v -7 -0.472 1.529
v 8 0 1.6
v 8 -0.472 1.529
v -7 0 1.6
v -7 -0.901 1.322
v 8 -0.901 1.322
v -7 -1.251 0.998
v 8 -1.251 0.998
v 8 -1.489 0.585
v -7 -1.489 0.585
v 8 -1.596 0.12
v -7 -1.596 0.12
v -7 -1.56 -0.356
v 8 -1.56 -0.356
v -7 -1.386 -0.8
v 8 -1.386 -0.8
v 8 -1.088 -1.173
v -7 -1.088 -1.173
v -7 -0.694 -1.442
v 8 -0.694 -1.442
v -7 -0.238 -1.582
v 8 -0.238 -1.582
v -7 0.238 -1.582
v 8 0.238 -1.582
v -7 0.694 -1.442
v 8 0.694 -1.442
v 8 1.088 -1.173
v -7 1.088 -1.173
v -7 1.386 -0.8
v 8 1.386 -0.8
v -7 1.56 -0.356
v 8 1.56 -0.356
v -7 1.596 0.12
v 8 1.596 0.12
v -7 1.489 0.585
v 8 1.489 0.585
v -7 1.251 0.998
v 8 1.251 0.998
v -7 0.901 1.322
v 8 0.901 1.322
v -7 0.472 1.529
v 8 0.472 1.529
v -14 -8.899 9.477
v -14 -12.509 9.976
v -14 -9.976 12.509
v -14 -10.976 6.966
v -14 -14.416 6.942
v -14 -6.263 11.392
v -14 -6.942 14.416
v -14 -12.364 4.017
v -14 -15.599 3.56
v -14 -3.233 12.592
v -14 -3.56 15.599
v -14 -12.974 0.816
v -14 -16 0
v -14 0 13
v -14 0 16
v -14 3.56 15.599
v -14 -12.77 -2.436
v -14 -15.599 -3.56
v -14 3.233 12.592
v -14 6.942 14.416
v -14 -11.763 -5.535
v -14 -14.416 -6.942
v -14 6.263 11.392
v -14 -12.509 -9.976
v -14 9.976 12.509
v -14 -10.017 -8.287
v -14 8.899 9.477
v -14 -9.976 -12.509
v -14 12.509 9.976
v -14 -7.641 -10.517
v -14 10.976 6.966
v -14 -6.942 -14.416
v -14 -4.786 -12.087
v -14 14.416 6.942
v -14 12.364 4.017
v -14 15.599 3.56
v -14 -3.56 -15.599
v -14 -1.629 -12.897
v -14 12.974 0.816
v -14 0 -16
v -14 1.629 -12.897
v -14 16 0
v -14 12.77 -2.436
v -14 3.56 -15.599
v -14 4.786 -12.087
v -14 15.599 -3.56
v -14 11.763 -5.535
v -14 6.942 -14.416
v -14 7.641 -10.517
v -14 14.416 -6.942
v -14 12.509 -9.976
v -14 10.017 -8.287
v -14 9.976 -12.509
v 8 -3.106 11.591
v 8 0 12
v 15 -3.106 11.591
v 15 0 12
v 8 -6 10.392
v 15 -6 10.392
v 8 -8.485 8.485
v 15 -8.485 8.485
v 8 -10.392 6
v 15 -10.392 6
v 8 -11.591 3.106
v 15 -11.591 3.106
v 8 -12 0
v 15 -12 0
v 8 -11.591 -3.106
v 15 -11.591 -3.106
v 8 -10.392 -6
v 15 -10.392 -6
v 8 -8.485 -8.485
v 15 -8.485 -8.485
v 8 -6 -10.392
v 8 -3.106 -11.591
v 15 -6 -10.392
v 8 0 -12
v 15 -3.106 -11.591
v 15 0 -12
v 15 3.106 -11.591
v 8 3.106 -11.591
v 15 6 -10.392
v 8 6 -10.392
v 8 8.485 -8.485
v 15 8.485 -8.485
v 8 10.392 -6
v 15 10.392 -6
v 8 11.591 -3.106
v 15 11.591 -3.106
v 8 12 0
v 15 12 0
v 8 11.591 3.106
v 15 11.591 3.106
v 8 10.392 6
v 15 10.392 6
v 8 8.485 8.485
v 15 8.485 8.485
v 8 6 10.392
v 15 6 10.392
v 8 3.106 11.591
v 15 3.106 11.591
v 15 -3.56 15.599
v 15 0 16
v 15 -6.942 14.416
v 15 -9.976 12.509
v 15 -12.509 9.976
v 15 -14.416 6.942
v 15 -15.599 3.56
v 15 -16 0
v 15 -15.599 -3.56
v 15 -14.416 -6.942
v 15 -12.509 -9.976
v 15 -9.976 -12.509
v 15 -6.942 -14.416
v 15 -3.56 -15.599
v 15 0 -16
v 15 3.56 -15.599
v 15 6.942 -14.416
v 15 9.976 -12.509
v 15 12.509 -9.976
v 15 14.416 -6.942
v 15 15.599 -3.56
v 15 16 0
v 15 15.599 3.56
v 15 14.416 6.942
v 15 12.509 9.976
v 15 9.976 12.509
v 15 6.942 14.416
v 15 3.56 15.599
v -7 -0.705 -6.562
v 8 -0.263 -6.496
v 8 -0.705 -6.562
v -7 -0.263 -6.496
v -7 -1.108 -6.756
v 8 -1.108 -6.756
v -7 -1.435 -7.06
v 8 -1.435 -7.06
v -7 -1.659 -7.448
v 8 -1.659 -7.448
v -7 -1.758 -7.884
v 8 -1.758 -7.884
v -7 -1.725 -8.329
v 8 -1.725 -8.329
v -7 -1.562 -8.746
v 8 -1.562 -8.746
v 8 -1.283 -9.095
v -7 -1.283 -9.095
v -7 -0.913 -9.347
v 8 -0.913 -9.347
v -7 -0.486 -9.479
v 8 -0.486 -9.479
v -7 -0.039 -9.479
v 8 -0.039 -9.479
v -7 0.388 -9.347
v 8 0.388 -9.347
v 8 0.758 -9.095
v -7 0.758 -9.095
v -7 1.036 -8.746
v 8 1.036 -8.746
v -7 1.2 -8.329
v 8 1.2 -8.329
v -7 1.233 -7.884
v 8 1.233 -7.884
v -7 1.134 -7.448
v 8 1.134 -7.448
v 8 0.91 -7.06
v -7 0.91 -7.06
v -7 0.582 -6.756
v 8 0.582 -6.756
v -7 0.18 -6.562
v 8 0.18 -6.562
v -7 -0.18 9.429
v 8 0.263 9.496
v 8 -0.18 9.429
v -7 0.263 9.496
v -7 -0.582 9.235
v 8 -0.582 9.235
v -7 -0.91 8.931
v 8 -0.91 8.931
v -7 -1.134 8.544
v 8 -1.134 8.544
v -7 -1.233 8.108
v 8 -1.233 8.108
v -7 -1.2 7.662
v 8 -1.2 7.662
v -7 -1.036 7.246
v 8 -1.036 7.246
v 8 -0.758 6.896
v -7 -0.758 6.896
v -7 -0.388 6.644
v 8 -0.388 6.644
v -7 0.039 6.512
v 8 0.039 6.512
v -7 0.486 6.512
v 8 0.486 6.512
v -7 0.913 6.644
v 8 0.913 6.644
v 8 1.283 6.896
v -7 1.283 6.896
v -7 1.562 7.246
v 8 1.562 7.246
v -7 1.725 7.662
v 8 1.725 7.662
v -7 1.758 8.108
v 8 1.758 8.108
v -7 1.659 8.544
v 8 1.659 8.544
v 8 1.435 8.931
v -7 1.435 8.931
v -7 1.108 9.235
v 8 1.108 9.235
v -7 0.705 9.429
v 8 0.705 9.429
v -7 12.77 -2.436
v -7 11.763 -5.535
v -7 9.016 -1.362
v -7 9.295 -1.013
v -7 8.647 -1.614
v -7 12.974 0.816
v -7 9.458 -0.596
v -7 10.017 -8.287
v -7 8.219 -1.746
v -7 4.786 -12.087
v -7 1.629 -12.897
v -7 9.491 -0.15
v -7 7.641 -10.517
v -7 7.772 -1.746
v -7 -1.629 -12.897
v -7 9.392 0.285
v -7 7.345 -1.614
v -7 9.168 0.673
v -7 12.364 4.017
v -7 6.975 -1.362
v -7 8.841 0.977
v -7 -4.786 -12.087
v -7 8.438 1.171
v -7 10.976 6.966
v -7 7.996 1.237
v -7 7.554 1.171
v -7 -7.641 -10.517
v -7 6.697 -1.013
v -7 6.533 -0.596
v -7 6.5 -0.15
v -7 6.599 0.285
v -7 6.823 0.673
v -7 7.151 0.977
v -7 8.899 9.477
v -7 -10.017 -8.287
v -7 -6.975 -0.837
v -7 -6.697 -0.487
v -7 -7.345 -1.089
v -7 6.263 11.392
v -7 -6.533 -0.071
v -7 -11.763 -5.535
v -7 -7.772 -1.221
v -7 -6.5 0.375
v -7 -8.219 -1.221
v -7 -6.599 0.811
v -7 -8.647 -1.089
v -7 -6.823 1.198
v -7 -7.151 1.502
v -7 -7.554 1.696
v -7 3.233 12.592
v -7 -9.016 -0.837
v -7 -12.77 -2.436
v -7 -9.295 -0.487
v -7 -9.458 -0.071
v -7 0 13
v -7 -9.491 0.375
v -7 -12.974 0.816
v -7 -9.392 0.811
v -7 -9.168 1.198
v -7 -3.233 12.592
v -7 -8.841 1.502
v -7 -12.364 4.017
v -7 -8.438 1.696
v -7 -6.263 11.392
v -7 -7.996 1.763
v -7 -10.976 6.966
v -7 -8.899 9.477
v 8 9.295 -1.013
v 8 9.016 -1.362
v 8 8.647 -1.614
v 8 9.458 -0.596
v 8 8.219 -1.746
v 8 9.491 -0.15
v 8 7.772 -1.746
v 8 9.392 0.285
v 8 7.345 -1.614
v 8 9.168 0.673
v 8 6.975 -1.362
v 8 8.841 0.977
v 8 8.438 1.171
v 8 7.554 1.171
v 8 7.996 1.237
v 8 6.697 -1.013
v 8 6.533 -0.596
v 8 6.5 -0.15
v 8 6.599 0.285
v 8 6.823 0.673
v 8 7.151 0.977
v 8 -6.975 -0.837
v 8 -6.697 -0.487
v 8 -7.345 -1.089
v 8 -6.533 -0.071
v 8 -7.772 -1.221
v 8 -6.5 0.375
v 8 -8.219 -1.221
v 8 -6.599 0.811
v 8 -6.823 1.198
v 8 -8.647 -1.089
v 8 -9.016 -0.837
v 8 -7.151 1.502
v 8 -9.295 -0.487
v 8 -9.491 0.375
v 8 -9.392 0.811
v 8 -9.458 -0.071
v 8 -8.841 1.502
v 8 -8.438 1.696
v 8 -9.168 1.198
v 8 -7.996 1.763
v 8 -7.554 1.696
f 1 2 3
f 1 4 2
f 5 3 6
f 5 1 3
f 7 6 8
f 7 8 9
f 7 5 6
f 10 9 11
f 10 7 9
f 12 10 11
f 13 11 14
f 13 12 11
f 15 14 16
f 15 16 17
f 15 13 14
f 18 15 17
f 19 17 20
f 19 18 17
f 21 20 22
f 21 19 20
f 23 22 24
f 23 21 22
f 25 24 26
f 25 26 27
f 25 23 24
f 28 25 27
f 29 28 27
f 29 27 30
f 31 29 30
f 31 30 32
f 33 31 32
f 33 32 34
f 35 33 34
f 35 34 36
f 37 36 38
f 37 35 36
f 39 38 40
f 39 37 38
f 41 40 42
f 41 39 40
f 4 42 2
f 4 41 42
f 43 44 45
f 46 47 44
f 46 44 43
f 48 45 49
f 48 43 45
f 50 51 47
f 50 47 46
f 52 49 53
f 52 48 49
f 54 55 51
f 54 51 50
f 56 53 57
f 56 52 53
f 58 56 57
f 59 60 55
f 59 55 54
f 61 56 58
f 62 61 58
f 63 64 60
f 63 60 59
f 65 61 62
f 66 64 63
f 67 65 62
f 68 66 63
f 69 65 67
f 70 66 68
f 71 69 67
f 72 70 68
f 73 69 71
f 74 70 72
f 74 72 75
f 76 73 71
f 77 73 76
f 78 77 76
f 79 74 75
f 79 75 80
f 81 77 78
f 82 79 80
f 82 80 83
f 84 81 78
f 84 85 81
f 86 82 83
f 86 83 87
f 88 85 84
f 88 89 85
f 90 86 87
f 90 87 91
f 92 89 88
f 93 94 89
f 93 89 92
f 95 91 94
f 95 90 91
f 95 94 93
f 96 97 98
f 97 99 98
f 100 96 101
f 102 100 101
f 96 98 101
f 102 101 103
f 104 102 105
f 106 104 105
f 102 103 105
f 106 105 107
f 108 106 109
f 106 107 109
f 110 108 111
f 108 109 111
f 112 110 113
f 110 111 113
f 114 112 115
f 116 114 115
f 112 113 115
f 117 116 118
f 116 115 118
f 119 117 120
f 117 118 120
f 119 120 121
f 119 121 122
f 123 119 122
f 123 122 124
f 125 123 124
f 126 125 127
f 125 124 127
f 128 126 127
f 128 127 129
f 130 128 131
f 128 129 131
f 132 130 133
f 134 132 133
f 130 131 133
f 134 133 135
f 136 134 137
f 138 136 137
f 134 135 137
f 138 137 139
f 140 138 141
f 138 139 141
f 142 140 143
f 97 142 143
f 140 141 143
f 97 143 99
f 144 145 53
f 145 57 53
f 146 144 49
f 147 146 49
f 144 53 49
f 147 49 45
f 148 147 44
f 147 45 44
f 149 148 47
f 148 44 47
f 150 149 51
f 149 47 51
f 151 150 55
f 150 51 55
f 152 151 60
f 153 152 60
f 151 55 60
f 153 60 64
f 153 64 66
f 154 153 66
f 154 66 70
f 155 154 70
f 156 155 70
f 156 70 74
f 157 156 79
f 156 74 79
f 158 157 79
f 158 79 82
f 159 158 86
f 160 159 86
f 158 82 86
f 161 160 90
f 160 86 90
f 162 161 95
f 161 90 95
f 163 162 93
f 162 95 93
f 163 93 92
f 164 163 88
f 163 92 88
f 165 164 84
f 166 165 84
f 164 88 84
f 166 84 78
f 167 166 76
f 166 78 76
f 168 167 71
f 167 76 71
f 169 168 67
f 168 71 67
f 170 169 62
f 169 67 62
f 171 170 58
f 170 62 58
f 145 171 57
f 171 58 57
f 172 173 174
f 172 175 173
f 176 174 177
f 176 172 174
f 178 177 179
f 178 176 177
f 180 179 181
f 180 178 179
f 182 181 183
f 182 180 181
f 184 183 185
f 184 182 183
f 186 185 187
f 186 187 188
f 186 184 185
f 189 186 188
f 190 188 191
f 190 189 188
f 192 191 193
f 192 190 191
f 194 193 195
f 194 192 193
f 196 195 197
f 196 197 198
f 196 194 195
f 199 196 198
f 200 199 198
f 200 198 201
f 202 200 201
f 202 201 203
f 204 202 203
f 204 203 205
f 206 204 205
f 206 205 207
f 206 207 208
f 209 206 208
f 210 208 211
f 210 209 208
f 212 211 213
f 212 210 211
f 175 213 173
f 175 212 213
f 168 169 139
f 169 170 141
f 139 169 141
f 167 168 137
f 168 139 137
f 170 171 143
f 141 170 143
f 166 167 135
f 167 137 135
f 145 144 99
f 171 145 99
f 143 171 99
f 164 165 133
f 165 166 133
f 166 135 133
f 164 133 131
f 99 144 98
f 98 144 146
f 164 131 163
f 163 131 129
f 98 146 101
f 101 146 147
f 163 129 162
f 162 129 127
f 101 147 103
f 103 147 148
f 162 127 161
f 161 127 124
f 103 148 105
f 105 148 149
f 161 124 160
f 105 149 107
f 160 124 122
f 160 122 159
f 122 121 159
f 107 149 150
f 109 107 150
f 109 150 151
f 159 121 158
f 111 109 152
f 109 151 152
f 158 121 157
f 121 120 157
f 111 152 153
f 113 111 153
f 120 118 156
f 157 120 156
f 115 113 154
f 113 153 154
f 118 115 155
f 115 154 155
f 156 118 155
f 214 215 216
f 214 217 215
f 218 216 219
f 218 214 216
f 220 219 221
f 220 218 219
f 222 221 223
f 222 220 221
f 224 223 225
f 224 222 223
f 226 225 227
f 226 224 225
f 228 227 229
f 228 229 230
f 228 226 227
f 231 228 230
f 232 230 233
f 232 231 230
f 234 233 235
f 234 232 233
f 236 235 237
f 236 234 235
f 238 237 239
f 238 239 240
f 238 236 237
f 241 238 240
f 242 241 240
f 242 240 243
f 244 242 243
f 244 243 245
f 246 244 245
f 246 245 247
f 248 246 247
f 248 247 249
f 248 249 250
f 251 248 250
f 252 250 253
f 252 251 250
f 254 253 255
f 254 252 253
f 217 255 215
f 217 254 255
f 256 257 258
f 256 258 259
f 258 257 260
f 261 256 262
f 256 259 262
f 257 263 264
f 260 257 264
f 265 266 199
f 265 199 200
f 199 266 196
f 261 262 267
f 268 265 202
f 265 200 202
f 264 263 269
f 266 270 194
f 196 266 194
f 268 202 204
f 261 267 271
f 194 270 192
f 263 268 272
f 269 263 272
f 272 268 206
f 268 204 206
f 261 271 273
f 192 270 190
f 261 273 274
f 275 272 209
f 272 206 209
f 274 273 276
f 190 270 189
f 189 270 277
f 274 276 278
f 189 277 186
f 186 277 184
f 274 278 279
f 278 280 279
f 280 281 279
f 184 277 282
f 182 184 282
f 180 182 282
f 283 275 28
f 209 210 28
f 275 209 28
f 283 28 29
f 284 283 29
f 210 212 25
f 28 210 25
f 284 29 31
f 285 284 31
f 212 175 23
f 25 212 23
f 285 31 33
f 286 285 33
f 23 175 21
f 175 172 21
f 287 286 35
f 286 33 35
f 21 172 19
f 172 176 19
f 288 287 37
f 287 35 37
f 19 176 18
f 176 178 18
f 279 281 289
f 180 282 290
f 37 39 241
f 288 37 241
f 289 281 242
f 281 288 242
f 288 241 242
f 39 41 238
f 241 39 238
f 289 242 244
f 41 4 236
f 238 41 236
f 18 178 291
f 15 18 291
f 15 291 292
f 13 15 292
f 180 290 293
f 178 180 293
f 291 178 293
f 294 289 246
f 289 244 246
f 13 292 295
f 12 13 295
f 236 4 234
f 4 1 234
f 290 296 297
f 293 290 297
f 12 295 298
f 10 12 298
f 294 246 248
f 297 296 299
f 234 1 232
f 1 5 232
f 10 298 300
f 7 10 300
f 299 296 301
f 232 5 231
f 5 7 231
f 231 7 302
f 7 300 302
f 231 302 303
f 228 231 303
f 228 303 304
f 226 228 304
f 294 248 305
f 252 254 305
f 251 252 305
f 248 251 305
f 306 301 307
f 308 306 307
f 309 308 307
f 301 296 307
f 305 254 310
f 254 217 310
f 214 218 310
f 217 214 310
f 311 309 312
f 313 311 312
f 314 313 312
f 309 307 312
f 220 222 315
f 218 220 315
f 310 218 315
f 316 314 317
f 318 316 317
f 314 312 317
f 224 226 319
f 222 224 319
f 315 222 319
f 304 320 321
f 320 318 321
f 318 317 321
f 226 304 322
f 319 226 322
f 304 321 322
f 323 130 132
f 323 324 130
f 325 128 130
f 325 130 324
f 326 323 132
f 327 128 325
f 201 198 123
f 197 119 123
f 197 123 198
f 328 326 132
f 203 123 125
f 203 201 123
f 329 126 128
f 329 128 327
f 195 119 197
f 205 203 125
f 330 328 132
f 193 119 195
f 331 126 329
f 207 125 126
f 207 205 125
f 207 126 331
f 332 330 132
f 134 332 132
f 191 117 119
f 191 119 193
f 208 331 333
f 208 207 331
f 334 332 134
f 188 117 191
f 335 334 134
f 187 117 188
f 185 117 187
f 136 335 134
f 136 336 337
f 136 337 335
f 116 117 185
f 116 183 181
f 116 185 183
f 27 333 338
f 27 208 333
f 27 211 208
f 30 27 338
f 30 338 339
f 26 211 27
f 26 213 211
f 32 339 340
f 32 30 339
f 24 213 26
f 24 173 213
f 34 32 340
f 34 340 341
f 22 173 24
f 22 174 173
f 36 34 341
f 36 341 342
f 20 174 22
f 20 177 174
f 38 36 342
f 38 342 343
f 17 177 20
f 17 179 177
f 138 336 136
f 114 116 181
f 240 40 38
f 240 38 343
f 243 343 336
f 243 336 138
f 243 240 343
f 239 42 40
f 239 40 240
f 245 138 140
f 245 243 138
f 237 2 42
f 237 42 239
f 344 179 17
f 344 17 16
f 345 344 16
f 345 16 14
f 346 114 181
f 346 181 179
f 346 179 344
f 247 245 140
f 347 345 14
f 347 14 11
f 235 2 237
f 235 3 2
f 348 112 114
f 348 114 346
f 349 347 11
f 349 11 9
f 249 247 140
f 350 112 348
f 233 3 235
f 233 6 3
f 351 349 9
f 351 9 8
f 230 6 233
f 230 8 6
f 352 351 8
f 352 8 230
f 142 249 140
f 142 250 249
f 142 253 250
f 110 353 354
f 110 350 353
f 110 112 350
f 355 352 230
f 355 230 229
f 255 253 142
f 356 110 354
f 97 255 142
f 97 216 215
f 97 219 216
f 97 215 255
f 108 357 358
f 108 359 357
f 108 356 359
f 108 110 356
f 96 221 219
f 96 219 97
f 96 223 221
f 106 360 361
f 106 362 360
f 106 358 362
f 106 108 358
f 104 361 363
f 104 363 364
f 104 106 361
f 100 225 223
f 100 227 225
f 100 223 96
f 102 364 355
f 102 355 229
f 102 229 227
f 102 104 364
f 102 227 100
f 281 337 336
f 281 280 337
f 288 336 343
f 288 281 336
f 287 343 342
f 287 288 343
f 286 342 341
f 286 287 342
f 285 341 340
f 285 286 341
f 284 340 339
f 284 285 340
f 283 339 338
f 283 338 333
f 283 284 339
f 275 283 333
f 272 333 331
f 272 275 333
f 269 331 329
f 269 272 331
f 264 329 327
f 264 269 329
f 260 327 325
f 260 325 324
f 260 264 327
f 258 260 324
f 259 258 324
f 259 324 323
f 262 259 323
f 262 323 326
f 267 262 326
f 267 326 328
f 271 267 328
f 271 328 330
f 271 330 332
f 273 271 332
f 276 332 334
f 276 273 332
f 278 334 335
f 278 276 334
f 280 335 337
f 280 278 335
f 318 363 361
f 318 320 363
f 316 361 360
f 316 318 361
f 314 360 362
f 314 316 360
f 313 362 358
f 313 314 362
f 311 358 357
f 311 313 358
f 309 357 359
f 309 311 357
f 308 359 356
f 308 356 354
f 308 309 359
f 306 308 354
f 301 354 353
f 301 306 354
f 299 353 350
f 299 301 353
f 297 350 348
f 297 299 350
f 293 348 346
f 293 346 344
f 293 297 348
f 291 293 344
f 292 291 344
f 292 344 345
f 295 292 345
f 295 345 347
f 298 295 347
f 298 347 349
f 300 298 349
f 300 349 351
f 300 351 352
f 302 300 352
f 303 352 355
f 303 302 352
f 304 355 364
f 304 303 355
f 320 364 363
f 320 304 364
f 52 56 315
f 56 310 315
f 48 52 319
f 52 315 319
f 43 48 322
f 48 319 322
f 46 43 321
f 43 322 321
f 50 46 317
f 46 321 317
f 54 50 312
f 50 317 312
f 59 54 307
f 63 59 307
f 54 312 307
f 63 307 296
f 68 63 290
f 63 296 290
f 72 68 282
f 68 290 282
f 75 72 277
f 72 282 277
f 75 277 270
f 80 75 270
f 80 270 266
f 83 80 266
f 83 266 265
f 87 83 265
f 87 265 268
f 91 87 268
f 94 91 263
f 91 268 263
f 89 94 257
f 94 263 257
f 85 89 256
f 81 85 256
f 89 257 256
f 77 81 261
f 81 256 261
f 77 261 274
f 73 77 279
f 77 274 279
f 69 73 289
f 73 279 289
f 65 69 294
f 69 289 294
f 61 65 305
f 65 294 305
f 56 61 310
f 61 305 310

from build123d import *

# Parameters (mm, degrees)
SKETCH4_R               = 1.5
CUT_EXTRUDE1_DEPTH      = 17
SKETCH5_R               = 12
SKETCH5_R_2             = 1.5
SKETCH5_R_3             = 1.6
BOSS_EXTRUDE1_DEPTH     = 2
CUT_EXTRUDE2_DEPTH      = 31.066592757
CUT_EXTRUDE2_DEPTH_BACK = 31.066592757
SKETCH6_W               = 2
SKETCH6_H               = 36


with BuildPart() as part:
    # Sketch3 → Revolve1 (revolve)
    with BuildSketch(Plane.XY, mode=Mode.PRIVATE) as revolve1_sk:
        Polygon((-7, 1.6), (6, 1.6), (6, 12), (15, 12), (15, 16), (-14, 16), (-14, 18), (-16, 18), (-16, 13), (-7, 13), align=None)
    revolve(revolve1_sk.sketch.rotate(Axis((0, 0, 0), (1, 0, 0)), 90), axis=Axis((0, 0, 0), (1, 0, 0)))

    # Sketch4 → Cut-Extrude1 (cut)
    with BuildSketch(Plane.ZY.offset(7)):
        with Locations((0.262567942, -7.995689969)):
            Circle(SKETCH4_R)
        with Locations((-7.995689969, -0.262567942)):
            Circle(SKETCH4_R)
        with Locations((-0.262567942, 7.995689969)):
            Circle(SKETCH4_R)
        with Locations((7.995689969, 0.262567942)):
            Circle(SKETCH4_R)
    extrude(amount=-CUT_EXTRUDE1_DEPTH, mode=Mode.SUBTRACT)

    # Sketch5 → Boss-Extrude1 (add)
    with BuildSketch(Plane(origin=(6, 0, 0), x_dir=(0, 0, -1), z_dir=(1, 0, 0))):
        with Locations(Location((0, 0, 0), (0, 0, 180))):
            Circle(SKETCH5_R)
        with Locations(Location((7.995689969, -0.262567942, 0), (0, 0, 180))):
            Circle(SKETCH5_R_2, mode=Mode.SUBTRACT)
        with Locations(Location((-0.262567942, -7.995689969, 0), (0, 0, 180))):
            Circle(SKETCH5_R_2, mode=Mode.SUBTRACT)
        with Locations(Location((-7.995689969, 0.262567942, 0), (0, 0, 180))):
            Circle(SKETCH5_R_2, mode=Mode.SUBTRACT)
        with Locations(Location((0.262567942, 7.995689969, 0), (0, 0, 180))):
            Circle(SKETCH5_R_2, mode=Mode.SUBTRACT)
        with Locations(Location((0, 0, 0), (0, 0, 180))):
            Circle(SKETCH5_R_3, mode=Mode.SUBTRACT)
    extrude(amount=BOSS_EXTRUDE1_DEPTH)

    # Sketch6 → Cut-Extrude2 (cut, two sides: drawn at the far end of the back side and taken through both)
    with BuildSketch(Plane.XY.offset(-CUT_EXTRUDE2_DEPTH_BACK)):
        with Locations((-15, 0)):
            Rectangle(SKETCH6_W, SKETCH6_H)
    extrude(amount=CUT_EXTRUDE2_DEPTH + CUT_EXTRUDE2_DEPTH_BACK, mode=Mode.SUBTRACT)


solid = part.part
